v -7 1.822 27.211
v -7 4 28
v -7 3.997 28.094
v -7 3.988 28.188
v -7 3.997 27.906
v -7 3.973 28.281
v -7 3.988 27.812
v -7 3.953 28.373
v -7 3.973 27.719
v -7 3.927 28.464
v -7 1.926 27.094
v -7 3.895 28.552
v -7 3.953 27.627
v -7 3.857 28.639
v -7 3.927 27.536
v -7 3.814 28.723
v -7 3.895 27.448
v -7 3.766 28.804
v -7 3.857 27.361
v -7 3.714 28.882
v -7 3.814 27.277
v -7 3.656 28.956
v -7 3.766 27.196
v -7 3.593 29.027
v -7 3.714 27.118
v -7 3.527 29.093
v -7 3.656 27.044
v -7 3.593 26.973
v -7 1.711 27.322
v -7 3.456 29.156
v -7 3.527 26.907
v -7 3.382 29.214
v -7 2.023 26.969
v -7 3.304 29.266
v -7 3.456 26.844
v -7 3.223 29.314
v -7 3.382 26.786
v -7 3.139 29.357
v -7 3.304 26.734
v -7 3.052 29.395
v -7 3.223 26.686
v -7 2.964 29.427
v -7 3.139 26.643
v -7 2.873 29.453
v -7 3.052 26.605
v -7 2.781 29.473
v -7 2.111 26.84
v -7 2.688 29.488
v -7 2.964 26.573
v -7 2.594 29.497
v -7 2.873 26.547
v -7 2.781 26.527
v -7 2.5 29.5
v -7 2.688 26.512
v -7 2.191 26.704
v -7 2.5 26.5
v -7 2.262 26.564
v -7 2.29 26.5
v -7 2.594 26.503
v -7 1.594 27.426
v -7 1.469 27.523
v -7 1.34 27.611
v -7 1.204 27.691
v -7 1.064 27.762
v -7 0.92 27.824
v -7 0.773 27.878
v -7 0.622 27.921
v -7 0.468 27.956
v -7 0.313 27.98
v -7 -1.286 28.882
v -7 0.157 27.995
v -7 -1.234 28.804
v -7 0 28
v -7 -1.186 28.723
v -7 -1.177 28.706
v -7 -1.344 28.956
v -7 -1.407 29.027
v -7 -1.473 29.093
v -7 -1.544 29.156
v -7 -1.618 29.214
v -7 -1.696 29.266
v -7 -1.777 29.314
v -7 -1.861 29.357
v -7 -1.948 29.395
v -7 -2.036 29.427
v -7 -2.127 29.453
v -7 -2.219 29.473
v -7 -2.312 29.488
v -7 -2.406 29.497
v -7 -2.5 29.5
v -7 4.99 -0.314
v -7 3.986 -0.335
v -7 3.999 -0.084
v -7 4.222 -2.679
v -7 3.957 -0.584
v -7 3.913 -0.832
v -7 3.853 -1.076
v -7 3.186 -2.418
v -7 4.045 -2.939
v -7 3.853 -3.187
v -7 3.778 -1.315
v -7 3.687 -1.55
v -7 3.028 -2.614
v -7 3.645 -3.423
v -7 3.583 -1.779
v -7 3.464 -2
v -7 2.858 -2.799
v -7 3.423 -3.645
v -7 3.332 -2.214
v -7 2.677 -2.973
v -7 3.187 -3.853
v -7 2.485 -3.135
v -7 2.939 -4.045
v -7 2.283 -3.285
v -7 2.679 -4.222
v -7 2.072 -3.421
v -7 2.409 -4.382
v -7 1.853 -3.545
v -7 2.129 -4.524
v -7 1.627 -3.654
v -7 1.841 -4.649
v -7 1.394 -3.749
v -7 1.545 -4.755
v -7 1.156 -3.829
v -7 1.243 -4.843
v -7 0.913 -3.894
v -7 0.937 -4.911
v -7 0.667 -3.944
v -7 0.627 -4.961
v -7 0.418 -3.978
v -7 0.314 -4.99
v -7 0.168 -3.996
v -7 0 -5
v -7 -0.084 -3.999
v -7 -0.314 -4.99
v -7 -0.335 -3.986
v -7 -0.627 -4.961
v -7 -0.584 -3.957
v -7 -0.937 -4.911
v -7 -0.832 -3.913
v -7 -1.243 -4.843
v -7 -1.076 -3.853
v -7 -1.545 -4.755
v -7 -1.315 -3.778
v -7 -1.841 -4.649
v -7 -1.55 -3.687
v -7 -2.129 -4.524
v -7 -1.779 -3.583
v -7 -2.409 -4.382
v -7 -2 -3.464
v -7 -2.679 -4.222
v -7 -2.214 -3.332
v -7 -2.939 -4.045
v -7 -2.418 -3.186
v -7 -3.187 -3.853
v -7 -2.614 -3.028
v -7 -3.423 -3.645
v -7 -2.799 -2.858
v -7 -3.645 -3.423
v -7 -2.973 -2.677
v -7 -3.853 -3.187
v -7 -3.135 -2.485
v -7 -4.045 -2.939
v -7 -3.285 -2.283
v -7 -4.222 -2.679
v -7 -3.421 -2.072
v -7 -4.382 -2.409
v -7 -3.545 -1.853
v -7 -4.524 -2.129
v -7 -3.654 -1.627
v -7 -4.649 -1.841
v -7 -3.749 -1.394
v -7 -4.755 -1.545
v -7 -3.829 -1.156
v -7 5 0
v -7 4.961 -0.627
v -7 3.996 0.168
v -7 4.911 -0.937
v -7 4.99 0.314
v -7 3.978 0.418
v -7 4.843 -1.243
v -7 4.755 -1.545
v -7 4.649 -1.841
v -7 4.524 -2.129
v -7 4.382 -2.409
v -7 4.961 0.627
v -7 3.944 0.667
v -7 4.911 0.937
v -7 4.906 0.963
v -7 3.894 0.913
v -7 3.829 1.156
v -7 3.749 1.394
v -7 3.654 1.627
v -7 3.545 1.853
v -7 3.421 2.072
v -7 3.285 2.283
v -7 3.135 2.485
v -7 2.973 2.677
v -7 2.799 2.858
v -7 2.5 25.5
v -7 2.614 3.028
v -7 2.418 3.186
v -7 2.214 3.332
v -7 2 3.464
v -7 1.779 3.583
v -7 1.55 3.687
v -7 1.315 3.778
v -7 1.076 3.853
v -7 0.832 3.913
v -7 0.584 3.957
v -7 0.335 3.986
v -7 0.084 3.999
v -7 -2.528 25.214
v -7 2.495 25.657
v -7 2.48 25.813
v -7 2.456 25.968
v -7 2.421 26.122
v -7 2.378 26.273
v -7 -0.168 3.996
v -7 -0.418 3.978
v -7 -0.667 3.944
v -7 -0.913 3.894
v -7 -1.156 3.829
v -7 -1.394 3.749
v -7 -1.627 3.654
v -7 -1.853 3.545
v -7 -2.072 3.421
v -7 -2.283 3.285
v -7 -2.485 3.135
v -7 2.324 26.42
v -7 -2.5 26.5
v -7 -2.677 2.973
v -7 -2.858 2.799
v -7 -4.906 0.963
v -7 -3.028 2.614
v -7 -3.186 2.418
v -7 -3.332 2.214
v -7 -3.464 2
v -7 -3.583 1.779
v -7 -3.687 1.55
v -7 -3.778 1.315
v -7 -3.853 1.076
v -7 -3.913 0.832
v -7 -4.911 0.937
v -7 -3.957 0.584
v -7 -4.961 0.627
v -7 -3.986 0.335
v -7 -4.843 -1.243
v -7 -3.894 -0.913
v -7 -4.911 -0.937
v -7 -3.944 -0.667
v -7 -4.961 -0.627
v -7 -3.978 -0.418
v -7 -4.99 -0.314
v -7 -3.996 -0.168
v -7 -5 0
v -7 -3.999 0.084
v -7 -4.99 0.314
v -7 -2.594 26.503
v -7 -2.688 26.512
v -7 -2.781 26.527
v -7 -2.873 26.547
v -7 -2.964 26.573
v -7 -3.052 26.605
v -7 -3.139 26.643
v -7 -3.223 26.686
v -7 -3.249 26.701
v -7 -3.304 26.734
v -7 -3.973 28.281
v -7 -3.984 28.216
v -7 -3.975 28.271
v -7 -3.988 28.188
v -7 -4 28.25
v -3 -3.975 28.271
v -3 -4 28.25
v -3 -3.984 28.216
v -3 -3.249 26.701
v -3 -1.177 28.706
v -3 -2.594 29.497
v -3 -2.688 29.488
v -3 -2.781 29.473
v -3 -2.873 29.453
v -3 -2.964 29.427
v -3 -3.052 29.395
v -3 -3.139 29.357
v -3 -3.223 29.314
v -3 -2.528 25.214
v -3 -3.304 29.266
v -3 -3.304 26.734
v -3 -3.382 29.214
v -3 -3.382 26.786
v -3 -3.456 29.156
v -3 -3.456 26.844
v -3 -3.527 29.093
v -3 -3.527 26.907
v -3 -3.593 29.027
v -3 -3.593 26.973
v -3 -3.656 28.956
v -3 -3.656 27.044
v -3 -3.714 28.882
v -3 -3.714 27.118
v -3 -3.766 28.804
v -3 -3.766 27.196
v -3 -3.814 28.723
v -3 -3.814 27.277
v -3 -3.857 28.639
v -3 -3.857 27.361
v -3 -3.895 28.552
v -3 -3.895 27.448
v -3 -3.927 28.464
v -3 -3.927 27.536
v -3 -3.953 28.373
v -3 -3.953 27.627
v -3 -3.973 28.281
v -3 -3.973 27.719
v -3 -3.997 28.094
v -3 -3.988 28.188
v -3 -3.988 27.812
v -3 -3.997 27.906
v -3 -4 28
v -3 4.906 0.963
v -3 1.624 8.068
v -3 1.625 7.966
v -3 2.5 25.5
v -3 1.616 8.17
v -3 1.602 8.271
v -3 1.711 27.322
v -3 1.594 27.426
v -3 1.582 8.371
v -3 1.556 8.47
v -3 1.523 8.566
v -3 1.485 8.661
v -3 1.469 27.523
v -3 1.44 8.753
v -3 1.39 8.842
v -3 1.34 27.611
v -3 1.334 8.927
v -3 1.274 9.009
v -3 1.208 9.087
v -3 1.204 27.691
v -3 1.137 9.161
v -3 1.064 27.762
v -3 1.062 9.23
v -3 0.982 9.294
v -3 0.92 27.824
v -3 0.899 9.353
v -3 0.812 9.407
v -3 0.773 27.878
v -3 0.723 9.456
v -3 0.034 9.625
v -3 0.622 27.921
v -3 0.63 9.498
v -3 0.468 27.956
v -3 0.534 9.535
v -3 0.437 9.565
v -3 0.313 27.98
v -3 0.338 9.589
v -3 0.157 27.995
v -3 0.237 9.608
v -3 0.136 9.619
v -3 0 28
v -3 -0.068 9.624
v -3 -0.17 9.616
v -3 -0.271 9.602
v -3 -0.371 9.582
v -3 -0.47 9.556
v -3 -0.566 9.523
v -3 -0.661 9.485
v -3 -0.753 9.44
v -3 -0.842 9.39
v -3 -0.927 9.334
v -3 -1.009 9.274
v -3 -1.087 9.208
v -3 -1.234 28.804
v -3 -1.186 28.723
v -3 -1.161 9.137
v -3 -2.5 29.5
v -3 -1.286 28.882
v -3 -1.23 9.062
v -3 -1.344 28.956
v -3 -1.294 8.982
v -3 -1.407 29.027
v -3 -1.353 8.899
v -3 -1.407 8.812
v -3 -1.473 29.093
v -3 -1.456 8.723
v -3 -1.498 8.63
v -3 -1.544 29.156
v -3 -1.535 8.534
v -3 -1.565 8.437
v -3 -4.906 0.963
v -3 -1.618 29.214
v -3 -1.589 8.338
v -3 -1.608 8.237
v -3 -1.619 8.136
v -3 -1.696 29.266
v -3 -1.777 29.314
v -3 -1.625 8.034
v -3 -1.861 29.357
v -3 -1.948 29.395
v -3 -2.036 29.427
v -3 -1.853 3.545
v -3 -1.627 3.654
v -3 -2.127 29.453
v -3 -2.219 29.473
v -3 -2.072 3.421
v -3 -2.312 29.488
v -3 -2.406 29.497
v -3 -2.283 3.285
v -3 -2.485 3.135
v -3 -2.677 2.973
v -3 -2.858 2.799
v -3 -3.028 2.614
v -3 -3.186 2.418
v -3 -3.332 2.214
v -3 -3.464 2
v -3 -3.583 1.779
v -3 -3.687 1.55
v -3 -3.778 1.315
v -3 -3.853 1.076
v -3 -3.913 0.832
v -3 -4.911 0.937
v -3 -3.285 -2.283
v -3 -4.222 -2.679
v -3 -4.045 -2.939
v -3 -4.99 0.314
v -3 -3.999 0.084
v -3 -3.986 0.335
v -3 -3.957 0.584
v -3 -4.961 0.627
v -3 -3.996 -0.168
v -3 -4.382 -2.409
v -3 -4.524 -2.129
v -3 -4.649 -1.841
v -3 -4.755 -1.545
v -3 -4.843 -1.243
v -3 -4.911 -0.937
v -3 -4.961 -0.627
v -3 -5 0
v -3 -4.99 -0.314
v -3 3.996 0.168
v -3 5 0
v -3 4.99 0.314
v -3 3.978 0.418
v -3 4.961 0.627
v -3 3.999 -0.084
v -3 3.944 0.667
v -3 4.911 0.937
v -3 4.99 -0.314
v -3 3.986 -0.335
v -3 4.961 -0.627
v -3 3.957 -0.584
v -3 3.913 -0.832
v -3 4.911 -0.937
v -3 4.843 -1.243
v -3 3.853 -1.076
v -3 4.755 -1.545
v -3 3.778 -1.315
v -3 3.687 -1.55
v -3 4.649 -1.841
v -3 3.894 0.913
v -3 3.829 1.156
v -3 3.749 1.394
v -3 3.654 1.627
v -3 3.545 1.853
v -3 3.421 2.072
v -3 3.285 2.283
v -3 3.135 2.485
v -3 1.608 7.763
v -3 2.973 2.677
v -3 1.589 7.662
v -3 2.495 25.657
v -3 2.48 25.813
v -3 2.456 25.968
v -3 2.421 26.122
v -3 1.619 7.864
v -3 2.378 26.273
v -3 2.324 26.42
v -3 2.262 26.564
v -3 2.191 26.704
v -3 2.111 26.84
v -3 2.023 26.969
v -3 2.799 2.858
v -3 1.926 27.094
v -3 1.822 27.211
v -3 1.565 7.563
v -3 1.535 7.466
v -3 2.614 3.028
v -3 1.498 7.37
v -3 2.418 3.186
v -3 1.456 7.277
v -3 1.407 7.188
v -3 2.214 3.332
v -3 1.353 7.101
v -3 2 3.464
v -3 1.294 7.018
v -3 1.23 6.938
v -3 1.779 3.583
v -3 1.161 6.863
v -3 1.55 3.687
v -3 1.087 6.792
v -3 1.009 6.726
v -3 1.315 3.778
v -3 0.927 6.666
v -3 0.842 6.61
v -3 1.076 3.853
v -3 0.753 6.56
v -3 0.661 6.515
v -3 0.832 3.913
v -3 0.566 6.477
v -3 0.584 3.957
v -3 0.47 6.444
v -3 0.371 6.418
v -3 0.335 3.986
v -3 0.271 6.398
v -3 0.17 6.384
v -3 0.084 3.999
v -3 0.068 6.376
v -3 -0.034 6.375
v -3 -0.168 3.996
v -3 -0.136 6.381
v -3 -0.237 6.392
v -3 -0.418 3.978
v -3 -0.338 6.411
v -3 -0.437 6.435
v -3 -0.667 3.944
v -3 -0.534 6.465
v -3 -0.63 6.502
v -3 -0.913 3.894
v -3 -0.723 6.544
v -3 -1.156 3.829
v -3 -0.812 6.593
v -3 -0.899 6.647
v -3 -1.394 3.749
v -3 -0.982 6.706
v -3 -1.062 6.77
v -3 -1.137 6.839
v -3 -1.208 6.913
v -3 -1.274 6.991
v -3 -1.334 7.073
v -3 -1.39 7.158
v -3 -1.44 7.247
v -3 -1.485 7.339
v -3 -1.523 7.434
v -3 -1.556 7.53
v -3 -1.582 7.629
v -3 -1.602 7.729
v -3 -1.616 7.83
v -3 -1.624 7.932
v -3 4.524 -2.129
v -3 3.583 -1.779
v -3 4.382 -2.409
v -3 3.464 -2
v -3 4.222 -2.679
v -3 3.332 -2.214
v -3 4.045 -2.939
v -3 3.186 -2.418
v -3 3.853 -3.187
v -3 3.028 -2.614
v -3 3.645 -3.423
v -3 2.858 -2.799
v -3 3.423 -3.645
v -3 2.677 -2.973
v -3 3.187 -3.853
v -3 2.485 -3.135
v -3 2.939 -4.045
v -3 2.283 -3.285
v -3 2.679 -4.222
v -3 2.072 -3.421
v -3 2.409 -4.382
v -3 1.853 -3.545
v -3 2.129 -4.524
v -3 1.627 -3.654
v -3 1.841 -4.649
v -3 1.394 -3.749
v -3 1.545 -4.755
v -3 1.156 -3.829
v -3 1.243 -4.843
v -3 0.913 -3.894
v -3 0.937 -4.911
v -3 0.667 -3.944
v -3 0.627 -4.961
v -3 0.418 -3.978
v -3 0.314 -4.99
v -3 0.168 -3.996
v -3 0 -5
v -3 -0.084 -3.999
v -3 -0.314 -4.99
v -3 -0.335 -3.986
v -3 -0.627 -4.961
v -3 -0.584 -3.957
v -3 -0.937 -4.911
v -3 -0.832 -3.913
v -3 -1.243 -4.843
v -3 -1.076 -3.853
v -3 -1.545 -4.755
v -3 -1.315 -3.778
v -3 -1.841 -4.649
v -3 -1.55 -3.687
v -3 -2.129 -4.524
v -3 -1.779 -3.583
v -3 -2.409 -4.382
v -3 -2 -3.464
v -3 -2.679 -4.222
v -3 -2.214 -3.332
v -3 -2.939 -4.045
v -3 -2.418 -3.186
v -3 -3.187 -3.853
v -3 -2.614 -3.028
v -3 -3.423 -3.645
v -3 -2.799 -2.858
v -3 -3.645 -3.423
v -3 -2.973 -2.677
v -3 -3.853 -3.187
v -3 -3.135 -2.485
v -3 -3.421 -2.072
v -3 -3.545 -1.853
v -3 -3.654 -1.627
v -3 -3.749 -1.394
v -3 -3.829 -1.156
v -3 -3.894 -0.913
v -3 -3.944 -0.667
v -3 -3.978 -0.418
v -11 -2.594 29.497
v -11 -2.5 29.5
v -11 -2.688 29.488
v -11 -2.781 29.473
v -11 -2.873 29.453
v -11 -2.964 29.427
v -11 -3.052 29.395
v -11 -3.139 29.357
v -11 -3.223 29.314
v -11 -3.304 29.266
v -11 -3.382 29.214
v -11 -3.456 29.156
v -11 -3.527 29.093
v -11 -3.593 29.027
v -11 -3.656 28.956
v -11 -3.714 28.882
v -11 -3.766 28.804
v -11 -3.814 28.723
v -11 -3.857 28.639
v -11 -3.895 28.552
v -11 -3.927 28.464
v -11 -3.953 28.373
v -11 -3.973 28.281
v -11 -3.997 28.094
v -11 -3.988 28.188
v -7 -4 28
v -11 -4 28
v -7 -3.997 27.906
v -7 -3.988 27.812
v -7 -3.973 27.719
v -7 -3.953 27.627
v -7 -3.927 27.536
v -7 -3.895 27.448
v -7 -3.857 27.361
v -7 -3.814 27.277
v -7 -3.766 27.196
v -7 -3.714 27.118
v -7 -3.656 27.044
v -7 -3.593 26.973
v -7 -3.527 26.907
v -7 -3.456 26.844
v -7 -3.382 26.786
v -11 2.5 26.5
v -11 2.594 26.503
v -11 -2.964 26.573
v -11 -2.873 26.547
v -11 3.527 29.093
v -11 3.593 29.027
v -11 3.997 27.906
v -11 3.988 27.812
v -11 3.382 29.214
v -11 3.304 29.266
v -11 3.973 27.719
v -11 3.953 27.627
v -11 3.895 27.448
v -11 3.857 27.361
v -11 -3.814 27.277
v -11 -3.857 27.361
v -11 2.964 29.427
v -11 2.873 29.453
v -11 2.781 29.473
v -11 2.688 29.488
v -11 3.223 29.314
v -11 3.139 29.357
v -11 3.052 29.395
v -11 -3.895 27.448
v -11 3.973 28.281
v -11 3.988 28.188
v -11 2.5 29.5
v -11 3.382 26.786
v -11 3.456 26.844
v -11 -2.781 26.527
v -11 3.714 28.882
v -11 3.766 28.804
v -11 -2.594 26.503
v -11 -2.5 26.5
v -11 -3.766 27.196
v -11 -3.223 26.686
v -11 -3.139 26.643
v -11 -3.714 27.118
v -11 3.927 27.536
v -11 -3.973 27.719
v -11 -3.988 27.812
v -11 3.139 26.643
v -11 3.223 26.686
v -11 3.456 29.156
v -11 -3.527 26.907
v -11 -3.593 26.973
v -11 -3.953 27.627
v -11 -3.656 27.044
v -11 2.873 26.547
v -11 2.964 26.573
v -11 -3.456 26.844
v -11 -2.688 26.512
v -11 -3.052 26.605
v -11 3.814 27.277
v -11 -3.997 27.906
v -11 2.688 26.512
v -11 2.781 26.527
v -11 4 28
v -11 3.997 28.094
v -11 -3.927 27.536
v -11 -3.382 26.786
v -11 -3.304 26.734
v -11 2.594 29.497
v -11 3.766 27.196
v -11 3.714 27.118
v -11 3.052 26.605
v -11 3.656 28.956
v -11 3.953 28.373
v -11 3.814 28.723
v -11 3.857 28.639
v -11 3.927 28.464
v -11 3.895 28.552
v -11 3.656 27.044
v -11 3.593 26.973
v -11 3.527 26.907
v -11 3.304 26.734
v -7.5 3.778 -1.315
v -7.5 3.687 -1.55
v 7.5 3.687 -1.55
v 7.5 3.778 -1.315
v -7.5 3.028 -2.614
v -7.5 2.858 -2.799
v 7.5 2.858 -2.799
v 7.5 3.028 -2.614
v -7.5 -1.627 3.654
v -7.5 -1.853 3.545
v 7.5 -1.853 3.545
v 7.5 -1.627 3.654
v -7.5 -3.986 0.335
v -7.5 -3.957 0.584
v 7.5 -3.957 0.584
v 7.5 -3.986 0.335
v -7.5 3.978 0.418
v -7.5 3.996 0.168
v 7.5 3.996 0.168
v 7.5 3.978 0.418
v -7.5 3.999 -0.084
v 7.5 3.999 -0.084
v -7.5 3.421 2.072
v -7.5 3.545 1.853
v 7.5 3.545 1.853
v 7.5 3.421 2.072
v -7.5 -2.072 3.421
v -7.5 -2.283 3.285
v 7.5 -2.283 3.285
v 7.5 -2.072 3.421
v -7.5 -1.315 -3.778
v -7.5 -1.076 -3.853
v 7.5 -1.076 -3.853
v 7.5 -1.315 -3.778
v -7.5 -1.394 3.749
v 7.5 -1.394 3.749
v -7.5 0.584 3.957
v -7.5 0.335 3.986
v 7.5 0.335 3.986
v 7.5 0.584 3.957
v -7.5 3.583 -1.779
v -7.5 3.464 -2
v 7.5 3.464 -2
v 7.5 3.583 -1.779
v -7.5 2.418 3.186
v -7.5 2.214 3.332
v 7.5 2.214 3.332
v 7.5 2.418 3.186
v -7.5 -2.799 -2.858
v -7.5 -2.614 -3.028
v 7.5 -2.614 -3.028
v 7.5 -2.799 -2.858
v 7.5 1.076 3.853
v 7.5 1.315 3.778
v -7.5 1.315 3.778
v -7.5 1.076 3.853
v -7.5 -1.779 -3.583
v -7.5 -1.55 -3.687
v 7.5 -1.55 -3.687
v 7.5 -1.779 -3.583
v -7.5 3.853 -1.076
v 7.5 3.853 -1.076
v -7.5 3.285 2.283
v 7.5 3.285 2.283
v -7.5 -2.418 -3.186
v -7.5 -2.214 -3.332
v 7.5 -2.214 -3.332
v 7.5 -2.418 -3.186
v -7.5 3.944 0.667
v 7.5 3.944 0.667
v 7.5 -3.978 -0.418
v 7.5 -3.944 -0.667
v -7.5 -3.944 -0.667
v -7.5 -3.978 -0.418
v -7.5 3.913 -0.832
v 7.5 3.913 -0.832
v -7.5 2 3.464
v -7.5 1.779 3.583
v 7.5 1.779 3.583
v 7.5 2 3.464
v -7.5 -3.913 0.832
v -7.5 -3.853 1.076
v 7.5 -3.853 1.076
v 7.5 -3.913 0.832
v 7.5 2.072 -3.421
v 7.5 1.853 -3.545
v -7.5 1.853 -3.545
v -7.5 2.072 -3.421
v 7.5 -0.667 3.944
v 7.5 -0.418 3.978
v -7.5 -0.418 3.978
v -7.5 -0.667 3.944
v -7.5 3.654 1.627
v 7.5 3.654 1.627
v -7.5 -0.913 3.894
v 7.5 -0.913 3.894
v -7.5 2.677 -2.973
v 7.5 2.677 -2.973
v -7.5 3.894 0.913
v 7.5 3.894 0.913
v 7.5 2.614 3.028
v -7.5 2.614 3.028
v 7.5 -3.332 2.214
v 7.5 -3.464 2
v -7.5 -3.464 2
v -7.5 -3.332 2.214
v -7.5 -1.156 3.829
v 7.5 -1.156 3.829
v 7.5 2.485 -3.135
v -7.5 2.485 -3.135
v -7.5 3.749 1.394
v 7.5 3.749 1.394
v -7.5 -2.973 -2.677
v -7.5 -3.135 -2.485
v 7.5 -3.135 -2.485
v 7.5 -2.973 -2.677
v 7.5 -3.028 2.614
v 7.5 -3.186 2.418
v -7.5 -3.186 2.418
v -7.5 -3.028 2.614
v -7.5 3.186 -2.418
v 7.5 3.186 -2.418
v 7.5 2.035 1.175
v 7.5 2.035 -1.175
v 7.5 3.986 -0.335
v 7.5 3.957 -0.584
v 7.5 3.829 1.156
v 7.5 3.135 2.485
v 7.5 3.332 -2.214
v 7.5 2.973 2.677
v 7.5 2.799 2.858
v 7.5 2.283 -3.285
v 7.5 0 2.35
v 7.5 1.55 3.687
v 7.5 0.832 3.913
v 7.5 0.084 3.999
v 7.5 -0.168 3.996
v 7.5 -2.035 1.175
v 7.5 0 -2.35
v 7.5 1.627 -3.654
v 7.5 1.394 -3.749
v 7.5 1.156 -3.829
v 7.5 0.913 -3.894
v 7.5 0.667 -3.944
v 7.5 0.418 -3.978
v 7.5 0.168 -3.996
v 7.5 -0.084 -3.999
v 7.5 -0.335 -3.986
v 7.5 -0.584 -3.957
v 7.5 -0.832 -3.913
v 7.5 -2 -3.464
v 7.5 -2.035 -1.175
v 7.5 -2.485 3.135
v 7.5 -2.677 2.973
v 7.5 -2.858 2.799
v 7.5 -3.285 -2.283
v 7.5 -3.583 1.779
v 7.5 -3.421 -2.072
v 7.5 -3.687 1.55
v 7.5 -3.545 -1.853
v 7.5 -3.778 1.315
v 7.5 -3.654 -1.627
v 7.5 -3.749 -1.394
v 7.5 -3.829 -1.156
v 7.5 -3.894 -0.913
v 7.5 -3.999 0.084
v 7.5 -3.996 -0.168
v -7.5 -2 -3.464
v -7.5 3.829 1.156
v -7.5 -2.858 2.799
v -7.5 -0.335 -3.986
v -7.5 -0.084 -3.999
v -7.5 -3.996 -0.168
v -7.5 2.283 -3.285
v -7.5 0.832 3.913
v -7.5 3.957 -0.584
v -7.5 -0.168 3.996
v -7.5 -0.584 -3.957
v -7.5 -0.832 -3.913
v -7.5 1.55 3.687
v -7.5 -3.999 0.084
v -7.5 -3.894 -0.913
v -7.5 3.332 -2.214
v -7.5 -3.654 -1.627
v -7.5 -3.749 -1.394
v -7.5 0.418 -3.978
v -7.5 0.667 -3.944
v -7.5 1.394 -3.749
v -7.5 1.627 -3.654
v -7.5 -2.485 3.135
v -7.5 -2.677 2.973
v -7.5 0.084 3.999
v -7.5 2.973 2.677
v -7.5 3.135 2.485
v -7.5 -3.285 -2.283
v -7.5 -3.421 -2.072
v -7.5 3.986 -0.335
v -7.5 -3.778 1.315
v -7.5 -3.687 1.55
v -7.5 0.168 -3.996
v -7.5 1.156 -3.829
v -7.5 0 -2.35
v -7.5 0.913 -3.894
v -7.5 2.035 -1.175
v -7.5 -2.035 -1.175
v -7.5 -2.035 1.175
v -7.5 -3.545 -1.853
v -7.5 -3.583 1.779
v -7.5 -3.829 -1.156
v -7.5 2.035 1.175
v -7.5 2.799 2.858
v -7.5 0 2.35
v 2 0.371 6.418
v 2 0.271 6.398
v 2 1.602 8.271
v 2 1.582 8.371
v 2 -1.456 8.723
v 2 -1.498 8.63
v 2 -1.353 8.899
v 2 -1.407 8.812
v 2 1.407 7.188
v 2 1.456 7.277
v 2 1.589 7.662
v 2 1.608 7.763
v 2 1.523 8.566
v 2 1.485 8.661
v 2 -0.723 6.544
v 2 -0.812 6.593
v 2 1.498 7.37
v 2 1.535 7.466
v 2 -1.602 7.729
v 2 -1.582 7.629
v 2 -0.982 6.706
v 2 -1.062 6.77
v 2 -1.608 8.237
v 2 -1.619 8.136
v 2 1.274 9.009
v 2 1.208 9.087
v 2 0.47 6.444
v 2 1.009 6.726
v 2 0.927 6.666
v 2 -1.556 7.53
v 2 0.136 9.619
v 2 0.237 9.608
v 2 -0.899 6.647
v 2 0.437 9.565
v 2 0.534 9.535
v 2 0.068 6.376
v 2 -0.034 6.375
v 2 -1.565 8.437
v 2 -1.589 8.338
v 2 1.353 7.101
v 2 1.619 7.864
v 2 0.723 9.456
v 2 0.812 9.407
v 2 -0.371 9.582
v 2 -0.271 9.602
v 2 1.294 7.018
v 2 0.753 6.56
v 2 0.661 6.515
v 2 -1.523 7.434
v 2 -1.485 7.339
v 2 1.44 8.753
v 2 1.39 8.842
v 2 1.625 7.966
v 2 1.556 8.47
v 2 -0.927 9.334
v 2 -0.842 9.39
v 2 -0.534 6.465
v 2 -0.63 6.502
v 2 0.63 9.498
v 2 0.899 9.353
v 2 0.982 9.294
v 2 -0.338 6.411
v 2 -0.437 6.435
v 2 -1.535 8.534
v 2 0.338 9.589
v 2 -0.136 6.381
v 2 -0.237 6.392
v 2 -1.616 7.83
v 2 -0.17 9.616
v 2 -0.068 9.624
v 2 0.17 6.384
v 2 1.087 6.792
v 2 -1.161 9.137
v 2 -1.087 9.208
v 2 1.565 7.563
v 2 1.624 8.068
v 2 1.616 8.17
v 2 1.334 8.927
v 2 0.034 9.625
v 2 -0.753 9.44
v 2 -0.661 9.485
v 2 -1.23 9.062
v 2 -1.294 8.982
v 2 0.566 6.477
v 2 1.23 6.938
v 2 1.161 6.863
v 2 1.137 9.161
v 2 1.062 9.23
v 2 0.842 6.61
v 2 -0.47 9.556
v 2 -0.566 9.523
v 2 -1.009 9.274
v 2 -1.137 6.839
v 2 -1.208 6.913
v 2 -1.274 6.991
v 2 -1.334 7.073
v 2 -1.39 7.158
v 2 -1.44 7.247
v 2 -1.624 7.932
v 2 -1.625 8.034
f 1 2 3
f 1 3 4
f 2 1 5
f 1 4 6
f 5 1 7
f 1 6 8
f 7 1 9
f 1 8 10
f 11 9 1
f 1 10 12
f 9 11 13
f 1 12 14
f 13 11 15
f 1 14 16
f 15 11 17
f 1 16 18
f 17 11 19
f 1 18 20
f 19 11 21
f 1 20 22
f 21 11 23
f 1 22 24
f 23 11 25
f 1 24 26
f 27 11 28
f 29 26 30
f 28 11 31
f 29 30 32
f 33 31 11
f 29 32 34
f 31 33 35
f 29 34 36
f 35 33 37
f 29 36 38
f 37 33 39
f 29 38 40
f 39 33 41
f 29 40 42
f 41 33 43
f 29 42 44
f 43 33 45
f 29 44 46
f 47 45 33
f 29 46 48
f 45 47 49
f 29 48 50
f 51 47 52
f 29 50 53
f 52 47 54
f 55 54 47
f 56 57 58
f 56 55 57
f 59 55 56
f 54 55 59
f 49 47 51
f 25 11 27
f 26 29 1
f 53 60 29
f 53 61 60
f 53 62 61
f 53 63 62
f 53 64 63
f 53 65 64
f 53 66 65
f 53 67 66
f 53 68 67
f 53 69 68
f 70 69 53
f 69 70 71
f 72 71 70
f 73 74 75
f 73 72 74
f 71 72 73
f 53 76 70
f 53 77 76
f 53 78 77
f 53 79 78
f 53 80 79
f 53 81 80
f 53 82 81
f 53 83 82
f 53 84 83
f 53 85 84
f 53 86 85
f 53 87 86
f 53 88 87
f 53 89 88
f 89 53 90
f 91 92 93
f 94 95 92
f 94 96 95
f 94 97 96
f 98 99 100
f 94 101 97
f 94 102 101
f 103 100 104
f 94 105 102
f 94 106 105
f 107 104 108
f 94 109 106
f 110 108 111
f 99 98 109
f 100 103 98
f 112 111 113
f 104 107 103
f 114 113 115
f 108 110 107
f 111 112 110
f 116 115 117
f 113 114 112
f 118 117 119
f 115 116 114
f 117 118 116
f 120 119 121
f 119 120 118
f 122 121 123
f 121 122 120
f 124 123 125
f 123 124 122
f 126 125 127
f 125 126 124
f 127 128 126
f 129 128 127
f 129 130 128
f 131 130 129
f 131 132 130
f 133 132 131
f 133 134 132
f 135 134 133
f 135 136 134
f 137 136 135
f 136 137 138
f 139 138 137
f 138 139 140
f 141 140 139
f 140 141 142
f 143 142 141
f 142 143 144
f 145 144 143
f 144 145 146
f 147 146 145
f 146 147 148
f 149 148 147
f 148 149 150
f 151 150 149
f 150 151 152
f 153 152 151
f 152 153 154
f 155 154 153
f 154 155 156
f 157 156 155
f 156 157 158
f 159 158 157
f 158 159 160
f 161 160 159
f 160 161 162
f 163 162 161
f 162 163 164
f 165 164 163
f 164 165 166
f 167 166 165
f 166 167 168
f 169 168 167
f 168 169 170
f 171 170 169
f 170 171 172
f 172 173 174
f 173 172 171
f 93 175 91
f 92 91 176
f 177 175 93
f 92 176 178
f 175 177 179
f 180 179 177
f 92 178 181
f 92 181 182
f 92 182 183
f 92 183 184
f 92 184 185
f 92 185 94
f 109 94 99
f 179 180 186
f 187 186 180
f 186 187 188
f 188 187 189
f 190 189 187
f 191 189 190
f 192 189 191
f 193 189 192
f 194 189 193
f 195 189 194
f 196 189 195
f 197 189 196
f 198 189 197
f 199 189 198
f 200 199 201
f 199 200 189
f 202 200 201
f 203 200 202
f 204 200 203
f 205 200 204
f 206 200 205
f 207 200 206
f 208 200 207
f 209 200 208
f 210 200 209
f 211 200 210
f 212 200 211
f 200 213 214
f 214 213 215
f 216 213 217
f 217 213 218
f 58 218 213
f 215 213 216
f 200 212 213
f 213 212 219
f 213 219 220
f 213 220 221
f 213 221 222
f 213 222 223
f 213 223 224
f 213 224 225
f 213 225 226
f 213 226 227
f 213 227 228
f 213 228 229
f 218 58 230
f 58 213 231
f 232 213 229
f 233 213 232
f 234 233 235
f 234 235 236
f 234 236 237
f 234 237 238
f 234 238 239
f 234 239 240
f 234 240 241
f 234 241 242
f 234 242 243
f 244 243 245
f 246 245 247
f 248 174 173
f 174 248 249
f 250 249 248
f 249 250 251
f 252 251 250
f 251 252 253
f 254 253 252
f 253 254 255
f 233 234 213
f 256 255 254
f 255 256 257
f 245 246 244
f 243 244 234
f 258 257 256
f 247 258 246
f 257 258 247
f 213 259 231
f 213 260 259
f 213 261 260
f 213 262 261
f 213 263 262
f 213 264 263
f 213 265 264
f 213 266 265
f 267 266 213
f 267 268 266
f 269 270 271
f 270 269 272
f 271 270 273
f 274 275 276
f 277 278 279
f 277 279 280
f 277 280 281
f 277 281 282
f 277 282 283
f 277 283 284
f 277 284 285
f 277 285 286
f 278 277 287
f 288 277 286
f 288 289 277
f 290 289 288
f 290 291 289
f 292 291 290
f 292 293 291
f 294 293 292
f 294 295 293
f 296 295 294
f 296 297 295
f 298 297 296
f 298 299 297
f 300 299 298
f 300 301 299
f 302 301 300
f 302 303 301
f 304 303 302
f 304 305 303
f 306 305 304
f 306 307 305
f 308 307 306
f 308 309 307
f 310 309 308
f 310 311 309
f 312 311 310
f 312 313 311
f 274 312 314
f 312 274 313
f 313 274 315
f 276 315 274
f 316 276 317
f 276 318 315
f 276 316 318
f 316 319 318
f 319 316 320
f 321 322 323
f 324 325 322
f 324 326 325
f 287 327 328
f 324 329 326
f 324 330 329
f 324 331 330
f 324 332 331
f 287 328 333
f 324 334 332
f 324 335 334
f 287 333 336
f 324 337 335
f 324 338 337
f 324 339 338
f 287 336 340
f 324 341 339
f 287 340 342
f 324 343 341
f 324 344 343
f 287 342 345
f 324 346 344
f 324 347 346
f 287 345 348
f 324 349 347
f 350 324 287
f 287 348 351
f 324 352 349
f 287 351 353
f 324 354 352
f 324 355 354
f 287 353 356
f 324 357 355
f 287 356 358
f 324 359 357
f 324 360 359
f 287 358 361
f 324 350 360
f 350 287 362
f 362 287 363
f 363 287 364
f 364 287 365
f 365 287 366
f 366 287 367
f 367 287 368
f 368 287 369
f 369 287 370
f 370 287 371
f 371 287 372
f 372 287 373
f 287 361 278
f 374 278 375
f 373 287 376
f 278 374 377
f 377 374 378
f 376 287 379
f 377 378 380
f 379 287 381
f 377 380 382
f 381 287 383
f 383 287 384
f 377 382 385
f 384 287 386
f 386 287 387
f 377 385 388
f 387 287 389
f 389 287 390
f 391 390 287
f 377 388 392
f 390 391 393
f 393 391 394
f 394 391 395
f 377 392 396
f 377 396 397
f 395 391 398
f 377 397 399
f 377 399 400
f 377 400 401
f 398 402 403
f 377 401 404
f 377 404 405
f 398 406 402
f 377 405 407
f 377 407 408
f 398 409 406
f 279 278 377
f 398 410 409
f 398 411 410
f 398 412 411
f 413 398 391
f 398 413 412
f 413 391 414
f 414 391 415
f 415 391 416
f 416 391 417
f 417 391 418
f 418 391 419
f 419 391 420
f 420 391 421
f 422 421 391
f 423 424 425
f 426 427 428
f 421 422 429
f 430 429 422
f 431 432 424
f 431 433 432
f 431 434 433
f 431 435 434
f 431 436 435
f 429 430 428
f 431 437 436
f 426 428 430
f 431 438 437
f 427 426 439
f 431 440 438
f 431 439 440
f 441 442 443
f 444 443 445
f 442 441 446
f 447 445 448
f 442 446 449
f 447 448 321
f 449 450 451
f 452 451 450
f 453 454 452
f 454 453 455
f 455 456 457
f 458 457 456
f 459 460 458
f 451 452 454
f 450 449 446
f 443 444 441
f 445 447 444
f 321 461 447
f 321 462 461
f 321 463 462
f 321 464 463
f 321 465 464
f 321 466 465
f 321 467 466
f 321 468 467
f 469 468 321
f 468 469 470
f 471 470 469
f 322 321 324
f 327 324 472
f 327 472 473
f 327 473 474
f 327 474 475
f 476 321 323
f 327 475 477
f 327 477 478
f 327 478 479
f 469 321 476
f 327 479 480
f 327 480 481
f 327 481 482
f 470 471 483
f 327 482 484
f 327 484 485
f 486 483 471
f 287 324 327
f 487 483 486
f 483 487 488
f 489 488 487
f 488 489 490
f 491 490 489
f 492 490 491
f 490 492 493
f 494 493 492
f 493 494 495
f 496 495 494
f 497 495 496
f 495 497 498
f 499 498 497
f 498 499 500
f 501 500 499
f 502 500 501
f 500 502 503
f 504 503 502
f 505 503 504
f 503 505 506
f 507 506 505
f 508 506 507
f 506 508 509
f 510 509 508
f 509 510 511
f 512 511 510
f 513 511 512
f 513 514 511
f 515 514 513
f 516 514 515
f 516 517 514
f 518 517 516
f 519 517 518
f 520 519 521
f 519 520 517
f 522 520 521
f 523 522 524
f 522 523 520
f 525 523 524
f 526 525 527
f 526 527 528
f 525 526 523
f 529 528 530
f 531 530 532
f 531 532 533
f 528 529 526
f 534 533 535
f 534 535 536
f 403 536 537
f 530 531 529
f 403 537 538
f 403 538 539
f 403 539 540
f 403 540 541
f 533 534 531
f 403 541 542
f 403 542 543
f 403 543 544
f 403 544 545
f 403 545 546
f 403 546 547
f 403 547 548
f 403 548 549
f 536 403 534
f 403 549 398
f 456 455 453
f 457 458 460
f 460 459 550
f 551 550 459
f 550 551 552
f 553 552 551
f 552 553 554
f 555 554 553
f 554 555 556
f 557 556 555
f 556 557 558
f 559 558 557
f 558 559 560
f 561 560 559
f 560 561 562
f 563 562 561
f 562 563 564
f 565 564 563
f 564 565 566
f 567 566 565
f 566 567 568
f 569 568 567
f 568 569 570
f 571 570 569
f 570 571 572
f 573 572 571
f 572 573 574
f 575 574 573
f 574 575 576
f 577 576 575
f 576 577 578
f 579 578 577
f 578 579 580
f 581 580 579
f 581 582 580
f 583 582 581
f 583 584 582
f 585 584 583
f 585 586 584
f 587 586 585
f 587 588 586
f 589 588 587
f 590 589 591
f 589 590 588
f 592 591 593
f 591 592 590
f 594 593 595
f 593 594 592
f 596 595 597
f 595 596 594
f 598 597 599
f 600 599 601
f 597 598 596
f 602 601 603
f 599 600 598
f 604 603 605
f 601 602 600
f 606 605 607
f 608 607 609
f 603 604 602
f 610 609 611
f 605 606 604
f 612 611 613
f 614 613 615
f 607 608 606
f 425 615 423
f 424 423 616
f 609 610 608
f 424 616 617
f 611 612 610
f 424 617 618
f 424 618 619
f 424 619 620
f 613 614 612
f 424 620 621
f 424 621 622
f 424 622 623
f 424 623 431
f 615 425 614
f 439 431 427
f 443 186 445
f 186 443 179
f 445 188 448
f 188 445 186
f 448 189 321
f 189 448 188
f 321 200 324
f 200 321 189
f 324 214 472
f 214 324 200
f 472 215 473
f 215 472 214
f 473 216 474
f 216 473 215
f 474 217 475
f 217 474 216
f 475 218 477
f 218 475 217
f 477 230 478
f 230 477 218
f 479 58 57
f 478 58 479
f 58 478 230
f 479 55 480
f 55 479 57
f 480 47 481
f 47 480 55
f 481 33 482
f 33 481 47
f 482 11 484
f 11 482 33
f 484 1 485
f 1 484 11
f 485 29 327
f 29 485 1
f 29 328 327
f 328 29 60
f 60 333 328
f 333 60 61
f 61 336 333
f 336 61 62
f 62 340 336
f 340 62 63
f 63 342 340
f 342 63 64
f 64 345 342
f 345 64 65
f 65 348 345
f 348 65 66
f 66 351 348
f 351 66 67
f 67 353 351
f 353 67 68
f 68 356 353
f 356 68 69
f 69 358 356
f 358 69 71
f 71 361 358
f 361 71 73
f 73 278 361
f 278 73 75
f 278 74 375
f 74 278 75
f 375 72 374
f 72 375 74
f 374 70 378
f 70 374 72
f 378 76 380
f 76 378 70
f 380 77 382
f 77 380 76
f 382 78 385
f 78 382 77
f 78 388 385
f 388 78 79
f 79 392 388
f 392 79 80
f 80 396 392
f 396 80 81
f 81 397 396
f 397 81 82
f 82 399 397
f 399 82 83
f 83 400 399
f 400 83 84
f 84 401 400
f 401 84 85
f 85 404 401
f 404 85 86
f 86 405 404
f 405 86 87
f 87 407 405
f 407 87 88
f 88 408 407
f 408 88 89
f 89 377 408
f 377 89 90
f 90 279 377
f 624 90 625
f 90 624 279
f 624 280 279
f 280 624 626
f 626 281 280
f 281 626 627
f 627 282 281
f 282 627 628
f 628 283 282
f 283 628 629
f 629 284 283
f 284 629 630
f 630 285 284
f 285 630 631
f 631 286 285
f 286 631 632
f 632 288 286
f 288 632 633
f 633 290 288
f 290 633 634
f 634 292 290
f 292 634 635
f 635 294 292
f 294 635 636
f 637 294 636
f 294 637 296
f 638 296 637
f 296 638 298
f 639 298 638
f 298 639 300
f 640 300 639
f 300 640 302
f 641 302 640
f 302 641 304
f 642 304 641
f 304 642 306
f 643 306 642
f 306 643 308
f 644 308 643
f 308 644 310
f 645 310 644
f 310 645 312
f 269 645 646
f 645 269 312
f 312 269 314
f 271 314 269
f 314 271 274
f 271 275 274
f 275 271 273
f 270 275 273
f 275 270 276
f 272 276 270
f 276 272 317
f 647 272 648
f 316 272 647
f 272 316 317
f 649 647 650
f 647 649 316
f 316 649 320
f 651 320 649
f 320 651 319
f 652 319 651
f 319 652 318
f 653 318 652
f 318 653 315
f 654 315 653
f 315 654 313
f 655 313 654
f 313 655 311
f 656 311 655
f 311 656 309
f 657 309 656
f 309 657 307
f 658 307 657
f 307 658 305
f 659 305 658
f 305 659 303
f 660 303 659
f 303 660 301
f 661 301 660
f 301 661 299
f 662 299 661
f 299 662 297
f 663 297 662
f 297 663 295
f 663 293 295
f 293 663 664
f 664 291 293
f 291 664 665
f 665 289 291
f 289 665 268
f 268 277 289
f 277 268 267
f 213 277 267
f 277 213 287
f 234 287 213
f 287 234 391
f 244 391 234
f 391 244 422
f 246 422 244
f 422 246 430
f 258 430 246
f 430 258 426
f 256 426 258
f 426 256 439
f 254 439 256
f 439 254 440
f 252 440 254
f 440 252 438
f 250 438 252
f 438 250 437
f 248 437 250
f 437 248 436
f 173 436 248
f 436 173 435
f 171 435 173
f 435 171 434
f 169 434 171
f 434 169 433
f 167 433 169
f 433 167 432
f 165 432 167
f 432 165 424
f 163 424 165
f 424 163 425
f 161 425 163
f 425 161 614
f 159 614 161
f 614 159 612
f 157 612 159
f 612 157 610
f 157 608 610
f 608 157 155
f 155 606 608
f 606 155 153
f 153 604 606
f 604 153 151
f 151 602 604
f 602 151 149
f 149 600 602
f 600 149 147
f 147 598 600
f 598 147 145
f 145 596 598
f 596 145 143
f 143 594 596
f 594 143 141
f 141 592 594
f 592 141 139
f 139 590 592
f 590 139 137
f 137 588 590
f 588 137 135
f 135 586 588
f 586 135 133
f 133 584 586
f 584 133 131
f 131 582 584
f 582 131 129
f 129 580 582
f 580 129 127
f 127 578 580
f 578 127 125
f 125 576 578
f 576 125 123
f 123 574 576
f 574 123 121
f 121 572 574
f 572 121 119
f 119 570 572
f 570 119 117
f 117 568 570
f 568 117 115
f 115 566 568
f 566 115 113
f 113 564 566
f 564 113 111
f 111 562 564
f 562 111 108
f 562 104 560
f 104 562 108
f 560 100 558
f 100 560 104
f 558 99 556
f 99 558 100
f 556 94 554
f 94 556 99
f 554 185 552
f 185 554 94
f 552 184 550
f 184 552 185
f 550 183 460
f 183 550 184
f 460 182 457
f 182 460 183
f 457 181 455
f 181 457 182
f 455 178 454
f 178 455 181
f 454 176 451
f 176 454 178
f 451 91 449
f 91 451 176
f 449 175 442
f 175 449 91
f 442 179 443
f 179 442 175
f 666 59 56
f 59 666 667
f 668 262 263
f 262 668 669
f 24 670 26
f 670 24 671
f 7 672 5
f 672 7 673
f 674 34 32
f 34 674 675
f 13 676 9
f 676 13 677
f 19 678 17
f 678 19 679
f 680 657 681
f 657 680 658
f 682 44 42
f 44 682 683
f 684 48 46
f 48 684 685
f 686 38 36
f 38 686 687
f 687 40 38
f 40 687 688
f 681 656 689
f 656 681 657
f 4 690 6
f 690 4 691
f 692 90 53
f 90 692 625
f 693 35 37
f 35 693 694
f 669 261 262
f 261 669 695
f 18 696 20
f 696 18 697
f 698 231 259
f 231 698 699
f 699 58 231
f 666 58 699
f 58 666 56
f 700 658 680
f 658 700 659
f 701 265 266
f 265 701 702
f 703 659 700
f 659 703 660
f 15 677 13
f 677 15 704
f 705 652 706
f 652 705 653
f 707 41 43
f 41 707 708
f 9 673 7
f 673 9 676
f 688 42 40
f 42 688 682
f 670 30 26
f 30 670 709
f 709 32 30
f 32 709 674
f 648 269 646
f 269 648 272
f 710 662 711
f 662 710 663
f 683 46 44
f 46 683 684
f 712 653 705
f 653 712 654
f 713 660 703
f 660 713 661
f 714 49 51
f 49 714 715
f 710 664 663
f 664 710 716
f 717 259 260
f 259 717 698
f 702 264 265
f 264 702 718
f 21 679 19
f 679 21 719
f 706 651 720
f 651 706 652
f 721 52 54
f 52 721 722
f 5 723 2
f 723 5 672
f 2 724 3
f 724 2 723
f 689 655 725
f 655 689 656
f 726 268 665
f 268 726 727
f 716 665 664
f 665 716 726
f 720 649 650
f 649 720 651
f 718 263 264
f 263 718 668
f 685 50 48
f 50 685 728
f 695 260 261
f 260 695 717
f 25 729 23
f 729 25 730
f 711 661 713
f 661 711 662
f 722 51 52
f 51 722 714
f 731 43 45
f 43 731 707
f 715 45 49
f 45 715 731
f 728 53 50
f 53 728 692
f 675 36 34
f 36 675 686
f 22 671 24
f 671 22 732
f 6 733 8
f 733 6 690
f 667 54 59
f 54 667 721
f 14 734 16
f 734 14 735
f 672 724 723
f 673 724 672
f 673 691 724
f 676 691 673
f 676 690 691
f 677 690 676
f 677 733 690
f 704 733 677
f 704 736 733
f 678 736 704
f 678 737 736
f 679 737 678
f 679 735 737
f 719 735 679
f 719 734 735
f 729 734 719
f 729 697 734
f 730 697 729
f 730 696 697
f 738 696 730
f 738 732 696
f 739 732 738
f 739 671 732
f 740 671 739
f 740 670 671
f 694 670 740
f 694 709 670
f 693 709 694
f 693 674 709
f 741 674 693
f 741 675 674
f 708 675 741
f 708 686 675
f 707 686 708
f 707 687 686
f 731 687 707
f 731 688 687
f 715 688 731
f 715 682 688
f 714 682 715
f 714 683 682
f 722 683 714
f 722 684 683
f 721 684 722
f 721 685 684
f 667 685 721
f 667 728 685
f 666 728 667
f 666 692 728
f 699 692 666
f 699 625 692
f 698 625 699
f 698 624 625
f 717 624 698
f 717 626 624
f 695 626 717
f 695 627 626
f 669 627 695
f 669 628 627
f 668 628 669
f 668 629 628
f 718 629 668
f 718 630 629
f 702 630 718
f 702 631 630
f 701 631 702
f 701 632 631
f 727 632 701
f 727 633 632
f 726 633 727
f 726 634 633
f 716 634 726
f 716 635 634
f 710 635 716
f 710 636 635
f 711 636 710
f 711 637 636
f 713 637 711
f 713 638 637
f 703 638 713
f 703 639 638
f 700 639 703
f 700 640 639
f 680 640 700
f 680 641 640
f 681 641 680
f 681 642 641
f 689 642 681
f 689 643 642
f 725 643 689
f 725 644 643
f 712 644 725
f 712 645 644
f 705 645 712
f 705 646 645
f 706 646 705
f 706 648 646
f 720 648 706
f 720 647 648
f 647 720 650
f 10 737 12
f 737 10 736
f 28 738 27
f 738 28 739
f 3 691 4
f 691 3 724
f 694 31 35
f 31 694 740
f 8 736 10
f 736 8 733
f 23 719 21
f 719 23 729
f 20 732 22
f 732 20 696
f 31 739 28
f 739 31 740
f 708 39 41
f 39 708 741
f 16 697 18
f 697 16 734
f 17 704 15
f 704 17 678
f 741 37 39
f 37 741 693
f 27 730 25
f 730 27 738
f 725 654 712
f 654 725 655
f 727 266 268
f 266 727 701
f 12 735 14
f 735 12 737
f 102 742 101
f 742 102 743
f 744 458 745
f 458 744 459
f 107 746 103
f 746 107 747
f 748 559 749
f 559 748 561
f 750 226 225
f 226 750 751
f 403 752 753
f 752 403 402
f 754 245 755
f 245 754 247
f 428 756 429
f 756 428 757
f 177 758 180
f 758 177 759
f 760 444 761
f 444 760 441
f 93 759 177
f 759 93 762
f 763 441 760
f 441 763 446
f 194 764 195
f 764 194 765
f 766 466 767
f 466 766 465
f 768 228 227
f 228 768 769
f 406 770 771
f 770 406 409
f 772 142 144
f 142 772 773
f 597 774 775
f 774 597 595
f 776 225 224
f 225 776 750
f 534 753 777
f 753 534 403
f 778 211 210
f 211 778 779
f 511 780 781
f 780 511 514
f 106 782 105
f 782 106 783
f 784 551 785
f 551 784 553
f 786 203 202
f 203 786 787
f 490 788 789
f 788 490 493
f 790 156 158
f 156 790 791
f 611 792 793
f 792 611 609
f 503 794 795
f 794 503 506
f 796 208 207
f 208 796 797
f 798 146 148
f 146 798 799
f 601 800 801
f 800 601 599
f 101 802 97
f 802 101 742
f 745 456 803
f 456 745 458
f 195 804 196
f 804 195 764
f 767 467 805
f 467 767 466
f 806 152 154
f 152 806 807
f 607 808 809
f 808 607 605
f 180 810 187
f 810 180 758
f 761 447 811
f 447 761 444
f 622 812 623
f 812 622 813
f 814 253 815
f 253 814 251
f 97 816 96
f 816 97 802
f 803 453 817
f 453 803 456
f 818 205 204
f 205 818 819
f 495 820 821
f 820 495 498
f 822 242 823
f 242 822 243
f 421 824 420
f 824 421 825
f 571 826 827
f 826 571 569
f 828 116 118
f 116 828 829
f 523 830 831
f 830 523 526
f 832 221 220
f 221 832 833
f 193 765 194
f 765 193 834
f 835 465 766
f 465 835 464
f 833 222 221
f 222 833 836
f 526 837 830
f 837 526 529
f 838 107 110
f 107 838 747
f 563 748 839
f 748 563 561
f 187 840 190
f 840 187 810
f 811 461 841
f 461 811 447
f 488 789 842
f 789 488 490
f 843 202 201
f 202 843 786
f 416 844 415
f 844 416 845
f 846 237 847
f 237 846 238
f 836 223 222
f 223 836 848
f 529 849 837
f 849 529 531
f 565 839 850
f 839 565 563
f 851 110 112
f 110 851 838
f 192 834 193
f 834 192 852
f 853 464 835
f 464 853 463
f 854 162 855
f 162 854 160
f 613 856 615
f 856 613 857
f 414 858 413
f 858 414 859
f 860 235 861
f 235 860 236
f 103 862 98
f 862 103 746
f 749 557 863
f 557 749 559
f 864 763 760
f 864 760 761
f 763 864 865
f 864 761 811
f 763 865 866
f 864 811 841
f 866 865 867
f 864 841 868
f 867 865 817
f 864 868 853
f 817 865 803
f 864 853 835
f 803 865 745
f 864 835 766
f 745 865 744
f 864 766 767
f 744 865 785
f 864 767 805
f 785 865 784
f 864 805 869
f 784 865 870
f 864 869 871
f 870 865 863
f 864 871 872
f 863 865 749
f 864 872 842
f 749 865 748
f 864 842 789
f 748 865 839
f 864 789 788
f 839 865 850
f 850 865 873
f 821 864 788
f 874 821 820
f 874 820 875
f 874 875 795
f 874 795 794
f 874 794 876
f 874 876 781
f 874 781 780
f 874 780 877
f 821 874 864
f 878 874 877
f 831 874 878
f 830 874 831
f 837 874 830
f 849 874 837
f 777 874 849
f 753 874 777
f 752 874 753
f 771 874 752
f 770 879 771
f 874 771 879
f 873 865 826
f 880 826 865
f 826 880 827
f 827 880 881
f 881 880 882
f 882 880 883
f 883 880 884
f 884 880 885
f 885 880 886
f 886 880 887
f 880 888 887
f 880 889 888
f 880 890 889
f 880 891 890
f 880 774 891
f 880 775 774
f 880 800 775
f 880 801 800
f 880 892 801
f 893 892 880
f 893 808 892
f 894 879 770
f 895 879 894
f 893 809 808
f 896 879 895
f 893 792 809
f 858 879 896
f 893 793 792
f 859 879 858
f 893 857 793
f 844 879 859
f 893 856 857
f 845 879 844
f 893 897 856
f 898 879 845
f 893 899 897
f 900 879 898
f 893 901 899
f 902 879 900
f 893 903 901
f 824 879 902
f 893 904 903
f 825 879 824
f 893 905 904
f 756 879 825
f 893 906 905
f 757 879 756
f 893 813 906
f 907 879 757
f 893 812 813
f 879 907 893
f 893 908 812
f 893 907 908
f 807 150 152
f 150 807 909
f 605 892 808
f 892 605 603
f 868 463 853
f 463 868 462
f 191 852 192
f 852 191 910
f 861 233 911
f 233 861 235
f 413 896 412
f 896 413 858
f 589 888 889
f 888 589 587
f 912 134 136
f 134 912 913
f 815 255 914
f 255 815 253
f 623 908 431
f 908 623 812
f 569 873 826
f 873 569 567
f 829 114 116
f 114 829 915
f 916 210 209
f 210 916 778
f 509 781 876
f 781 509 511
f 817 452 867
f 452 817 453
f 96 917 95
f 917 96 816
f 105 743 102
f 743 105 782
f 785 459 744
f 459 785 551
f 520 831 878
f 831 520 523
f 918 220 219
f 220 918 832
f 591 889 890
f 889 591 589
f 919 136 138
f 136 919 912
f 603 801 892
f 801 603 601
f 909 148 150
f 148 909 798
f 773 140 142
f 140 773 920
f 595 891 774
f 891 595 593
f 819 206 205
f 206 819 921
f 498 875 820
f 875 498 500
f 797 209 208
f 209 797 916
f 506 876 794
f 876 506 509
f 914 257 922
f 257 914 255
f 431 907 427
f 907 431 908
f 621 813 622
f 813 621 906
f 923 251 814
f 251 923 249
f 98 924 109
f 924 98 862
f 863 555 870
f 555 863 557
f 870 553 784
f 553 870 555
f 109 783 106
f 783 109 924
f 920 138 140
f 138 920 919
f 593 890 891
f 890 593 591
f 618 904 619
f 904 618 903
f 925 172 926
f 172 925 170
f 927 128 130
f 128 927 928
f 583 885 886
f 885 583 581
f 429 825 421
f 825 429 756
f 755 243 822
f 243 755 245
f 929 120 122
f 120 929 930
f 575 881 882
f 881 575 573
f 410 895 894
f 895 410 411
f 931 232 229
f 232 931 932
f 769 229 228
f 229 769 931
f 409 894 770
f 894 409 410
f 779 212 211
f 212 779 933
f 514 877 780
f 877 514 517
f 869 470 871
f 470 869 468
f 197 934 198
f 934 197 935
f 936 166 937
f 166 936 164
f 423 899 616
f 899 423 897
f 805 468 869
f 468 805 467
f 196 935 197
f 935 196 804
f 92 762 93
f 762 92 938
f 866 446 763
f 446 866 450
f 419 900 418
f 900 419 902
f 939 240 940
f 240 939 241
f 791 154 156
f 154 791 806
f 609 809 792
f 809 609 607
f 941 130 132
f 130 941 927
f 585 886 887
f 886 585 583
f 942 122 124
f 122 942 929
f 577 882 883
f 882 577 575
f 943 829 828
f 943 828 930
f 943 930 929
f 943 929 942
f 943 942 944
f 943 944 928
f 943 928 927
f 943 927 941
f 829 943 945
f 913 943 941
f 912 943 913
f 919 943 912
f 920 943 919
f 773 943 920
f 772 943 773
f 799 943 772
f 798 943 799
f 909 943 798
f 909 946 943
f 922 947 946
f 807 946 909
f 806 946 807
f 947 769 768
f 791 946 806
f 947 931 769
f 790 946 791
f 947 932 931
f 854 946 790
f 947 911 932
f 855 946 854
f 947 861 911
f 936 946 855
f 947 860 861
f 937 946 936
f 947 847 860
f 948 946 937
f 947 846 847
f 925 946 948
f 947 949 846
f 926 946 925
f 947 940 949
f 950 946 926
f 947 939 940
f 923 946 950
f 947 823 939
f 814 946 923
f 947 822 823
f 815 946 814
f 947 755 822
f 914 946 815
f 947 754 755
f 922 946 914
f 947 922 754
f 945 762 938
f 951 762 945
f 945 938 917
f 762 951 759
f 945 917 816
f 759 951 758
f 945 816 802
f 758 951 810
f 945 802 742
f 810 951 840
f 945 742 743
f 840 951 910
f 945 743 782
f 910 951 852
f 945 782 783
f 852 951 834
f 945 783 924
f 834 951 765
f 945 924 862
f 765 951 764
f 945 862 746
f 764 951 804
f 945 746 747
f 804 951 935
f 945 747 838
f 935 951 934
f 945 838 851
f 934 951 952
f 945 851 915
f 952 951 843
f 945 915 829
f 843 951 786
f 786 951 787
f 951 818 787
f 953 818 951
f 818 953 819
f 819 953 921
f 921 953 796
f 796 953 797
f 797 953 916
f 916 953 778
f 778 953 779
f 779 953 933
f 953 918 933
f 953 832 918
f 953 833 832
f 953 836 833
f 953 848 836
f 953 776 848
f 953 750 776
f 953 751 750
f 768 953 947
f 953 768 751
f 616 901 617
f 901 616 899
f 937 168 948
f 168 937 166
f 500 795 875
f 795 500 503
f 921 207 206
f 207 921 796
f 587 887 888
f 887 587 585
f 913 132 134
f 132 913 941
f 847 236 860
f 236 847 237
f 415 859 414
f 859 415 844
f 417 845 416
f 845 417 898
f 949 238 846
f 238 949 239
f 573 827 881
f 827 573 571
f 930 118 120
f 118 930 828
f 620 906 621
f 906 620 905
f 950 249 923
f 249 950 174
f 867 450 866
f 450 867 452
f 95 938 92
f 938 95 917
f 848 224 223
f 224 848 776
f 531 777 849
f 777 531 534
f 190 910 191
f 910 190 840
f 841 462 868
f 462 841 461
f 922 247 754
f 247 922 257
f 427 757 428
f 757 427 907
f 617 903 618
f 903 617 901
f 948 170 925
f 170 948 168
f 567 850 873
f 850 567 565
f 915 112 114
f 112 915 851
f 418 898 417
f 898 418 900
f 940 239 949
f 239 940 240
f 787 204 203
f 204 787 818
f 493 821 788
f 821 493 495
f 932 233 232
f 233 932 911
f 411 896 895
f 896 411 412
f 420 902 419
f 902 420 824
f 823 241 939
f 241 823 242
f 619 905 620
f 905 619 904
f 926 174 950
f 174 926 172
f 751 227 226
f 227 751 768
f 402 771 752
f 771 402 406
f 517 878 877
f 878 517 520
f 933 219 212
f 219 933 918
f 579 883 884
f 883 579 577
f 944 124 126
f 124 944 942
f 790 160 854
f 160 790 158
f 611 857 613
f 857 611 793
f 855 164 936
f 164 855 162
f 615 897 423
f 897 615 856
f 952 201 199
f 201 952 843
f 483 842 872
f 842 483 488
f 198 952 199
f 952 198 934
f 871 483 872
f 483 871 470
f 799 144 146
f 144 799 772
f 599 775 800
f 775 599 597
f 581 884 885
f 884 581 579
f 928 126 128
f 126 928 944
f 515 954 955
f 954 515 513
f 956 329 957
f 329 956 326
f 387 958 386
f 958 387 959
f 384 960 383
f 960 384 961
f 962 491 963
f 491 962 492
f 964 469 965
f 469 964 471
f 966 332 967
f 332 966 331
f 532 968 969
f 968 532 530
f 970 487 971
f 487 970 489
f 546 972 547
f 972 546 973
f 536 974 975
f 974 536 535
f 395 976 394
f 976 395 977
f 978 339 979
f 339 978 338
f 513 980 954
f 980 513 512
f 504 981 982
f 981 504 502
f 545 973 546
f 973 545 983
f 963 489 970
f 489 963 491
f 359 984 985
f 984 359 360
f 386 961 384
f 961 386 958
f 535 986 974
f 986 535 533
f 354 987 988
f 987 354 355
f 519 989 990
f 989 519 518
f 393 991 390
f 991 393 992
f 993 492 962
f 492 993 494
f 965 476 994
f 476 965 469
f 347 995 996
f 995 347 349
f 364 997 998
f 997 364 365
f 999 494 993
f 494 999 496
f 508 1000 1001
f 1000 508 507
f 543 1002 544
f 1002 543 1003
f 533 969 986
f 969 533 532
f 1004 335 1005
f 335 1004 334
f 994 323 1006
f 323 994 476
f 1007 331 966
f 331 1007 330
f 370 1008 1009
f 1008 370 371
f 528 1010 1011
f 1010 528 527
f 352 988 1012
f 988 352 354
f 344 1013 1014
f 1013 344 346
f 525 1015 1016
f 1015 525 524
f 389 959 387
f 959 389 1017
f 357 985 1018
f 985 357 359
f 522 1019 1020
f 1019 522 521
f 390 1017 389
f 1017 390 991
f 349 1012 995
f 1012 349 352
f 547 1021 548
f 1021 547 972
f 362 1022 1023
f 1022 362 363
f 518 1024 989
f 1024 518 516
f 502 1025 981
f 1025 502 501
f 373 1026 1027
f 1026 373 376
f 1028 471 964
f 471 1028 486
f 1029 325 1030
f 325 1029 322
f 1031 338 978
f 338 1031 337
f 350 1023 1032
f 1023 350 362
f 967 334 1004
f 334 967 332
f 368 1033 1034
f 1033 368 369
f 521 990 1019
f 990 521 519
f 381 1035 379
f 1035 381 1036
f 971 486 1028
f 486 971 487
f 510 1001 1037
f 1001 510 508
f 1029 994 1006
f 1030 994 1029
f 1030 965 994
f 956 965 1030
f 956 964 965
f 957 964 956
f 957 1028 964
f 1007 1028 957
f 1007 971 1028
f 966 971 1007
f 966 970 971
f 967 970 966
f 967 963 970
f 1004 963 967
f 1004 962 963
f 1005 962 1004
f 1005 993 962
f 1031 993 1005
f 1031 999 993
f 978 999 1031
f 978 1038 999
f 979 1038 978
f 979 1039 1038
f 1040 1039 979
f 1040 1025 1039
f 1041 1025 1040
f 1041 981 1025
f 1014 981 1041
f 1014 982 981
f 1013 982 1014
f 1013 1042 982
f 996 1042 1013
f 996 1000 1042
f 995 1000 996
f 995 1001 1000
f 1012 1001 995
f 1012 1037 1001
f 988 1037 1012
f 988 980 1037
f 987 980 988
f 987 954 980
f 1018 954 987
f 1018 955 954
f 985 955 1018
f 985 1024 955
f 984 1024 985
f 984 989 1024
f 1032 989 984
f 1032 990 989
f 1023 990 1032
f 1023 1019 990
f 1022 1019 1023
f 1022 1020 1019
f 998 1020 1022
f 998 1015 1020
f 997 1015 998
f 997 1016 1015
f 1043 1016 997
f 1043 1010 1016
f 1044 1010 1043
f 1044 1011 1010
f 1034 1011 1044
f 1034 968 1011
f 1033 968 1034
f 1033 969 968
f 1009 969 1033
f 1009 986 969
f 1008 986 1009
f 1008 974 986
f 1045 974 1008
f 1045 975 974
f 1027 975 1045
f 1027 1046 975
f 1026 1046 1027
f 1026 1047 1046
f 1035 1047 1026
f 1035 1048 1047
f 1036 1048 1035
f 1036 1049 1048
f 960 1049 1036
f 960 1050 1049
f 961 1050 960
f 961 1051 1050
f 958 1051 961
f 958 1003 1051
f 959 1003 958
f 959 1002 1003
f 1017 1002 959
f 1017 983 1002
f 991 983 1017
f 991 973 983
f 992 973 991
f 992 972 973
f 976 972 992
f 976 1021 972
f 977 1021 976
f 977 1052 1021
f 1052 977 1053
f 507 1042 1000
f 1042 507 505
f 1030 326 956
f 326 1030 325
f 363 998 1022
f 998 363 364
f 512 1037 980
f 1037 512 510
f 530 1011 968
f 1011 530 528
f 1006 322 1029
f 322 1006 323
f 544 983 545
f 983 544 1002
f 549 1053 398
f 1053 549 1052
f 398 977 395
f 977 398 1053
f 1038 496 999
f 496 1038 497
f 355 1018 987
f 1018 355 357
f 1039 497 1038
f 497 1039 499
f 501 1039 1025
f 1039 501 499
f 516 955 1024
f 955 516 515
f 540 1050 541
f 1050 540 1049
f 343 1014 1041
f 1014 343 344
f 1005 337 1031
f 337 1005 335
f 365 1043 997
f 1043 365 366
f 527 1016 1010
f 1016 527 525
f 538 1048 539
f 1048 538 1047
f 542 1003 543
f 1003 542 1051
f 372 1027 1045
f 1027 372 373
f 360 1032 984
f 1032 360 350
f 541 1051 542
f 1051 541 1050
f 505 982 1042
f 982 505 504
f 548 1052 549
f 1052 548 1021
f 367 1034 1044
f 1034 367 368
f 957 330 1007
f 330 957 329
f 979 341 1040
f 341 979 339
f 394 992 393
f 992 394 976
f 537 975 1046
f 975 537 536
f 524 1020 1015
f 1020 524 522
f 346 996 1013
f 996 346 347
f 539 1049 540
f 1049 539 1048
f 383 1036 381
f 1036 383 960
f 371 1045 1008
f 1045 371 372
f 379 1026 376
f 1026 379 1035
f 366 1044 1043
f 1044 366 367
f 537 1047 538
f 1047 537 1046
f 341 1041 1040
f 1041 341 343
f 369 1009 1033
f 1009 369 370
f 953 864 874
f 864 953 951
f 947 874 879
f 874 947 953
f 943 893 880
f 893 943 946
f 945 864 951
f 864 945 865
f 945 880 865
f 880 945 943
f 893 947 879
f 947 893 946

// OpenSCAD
$fn=100;
//shaft();


difference() {
    union() {
        translate([-7, 0, 0]) rotate([90, -90, 90]) union() {
            linear_extrude(4) union() {
                circle(5);
                polygon([[0,-5],[0,5],[30-4.5,2.5],[30-4.5,-2.5]]);
                translate([30-4.5,0]) circle(2.5);
                translate([28,2.5]) circle(1.5);
                polygon([
                    [29.5, 2.5],
                    [28.25, 4],
                    [20,0],
                    [30-2,0]
                ]);
            }
            translate([28, 0, -4]) rotate([0, 0, 90]) linear_extrude(4) union() {
                translate([-4+1.5, 0]) circle(1.5);
                translate([-2.5, -1.5]) square([5,3]);
                translate([4-1.5, 0]) circle(1.5);
            }
        }
        rotate([90, 30, 90]) cylinder(h=15, r=4, center=true);
        translate([-0.5, 0, 8]) rotate([90, 30, 90]) cylinder(h=5, d=3.25, center=true);
    }
    rotate([90, 30, 90]) cylinder(h=115, d=4.7, center=true, $fn=6);
}

module shaft() {
    color("blue") rotate([90, 0, 90]) cylinder(h=115, r=2, center=true, $fn=6);
}
